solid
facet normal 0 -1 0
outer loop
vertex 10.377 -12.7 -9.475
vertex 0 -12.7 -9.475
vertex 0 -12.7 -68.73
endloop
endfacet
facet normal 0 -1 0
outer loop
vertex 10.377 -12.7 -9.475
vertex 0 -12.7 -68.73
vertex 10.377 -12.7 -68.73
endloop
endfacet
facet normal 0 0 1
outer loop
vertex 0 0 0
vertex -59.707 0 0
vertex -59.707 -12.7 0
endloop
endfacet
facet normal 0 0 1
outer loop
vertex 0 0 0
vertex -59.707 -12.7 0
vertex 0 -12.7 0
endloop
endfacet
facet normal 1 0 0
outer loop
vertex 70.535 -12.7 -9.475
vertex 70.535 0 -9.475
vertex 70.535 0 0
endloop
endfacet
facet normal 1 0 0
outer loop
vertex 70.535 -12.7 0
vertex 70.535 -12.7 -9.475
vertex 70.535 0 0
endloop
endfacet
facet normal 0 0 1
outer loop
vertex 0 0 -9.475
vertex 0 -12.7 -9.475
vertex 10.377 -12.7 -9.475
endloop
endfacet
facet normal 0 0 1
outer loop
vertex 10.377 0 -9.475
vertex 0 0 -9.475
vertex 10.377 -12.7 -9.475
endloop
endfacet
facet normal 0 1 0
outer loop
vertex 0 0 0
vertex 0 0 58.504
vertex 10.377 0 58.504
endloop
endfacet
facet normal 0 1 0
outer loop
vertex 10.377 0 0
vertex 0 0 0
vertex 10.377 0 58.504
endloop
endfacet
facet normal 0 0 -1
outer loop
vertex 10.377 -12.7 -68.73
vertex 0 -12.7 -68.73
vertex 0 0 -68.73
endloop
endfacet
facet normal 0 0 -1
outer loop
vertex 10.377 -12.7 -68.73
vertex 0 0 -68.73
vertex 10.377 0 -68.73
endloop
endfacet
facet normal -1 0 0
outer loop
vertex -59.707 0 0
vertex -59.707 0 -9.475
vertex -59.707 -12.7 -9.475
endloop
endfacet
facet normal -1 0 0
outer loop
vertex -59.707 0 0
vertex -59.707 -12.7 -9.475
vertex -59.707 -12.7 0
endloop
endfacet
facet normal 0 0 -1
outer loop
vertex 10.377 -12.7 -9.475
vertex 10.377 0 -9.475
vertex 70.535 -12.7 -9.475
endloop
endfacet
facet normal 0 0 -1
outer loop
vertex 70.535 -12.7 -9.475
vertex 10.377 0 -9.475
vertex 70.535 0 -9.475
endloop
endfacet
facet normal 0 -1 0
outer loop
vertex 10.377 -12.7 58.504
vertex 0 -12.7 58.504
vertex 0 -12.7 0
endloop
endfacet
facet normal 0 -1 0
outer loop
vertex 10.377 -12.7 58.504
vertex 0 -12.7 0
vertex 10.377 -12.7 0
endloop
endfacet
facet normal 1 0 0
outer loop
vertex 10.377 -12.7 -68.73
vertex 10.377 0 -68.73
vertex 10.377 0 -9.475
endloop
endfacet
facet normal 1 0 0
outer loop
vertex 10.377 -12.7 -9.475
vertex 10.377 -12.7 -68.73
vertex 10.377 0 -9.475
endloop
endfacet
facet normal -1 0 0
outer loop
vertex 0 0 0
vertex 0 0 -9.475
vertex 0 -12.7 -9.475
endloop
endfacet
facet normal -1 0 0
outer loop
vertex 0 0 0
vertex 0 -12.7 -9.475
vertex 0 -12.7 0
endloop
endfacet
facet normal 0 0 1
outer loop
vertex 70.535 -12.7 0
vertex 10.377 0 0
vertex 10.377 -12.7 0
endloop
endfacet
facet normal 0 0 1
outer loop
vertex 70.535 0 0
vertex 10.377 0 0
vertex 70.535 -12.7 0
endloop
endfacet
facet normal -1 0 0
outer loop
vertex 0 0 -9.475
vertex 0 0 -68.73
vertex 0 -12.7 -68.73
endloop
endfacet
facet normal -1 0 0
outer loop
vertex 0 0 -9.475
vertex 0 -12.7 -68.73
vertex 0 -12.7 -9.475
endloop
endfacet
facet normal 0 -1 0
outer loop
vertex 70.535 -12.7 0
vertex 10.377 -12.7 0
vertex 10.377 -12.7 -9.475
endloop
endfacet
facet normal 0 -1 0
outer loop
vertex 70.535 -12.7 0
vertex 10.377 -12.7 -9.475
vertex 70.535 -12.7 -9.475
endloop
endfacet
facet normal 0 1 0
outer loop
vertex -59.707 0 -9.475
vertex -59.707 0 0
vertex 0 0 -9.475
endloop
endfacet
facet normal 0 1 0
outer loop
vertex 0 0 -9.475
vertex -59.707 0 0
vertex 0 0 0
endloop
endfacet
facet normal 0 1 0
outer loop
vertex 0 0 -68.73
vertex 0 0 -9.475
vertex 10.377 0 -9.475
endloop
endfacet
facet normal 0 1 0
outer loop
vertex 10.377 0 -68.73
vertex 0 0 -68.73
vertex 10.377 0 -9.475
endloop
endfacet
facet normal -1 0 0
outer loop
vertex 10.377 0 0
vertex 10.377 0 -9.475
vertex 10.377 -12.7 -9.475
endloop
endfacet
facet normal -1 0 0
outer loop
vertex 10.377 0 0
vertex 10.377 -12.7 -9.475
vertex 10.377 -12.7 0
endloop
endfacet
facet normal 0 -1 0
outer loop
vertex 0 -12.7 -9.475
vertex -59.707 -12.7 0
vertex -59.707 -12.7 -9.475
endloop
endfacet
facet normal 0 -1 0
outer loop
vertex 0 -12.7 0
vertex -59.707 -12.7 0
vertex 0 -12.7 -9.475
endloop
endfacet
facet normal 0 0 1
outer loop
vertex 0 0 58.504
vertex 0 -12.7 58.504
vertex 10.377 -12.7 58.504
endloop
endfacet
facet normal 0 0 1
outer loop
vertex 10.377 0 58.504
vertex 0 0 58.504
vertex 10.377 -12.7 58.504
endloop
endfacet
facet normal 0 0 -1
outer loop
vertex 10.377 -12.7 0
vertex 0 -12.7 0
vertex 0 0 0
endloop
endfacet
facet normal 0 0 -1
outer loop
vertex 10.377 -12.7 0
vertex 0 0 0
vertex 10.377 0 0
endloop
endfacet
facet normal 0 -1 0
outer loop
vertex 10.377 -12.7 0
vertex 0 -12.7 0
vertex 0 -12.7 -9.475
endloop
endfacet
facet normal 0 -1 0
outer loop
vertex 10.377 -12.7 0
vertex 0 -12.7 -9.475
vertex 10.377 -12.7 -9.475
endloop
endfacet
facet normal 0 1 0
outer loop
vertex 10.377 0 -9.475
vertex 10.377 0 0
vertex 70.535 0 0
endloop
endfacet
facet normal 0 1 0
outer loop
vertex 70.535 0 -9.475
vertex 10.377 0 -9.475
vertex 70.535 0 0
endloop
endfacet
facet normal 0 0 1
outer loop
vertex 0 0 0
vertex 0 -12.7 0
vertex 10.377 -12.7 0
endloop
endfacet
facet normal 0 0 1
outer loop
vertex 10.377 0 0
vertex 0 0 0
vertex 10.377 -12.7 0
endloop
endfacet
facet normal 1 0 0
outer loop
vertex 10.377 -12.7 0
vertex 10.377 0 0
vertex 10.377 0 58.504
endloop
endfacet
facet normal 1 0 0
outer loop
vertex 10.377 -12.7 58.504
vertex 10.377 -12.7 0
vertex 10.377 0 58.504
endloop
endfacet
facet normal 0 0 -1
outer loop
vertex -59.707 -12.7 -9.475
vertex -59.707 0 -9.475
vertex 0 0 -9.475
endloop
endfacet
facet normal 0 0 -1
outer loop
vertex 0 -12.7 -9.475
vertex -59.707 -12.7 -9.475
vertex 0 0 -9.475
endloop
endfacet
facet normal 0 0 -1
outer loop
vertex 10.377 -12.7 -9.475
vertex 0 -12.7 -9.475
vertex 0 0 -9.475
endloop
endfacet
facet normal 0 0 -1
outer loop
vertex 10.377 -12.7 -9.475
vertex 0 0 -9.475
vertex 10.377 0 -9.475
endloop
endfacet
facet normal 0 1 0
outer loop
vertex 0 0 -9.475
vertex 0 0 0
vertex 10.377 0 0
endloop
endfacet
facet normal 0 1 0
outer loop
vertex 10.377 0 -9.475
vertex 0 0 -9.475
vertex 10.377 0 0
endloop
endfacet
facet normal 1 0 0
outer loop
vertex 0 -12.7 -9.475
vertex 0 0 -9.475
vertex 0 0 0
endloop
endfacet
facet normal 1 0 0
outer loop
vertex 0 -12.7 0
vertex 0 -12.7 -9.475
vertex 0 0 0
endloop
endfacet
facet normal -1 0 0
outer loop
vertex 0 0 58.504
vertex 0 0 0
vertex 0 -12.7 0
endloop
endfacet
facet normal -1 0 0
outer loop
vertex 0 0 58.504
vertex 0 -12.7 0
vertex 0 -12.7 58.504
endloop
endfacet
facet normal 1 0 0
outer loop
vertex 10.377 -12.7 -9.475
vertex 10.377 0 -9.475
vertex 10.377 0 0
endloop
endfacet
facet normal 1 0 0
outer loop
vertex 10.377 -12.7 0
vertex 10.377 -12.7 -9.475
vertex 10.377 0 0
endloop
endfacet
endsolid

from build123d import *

# Parameters (mm, degrees)
F0_W     = 59.706710279
F0_H     = 9.4748688862
F1_DEPTH = 12.7
F0_W_2   = 10.3772366419
F0_H_2   = 58.5035607219
F0_W_3   = 60.1578941569
F0_H_3   = 59.2555301264
F2_DEPTH = 12.7


# Not quite as in the source:
# - a feature of the source that left no trace in its solid (it failed there, or was rolled back) is left out
# - the program builds the solid bodies; features that only make, move or delete a surface that nothing else refers to are left out


with BuildPart() as f1:
    # F0 (on Front) → F1 (new body)
    with BuildSketch(Plane.XZ):
        with Locations((-29.8533551395, -4.7374344431)):
            Rectangle(F0_W, F0_H)
    extrude(amount=F1_DEPTH)


with BuildPart() as f1b:
    # F0 (on Front) → F1, piece 2 (new body)
    with BuildSketch(Plane.XZ):
        with Locations((5.188618321, 29.2517803609)):
            Rectangle(F0_W_2, F0_H_2)
    extrude(amount=F1_DEPTH)


with BuildPart() as f1c:
    # F0 (on Front) → F1, piece 3 (new body)
    with BuildSketch(Plane.XZ):
        with Locations((40.4561837204, -4.7374344431)):
            Rectangle(F0_W_3, F0_H)
    extrude(amount=F1_DEPTH)


with BuildPart() as f1d:
    # F0 (on Front) → F1, piece 4 (new body)
    with BuildSketch(Plane.XZ):
        with Locations((5.188618321, -39.1026339494)):
            Rectangle(F0_W_2, F0_H_3)
    extrude(amount=F1_DEPTH)


with BuildPart() as f2:
    # F0 (on Front) → F2 (new body)
    with BuildSketch(Plane.XZ):
        with Locations((5.188618321, -4.7374344431)):
            Rectangle(F0_W_2, F0_H)
    extrude(amount=F2_DEPTH)


solid = Compound([f1.part, f1b.part, f1c.part, f1d.part, f2.part])
